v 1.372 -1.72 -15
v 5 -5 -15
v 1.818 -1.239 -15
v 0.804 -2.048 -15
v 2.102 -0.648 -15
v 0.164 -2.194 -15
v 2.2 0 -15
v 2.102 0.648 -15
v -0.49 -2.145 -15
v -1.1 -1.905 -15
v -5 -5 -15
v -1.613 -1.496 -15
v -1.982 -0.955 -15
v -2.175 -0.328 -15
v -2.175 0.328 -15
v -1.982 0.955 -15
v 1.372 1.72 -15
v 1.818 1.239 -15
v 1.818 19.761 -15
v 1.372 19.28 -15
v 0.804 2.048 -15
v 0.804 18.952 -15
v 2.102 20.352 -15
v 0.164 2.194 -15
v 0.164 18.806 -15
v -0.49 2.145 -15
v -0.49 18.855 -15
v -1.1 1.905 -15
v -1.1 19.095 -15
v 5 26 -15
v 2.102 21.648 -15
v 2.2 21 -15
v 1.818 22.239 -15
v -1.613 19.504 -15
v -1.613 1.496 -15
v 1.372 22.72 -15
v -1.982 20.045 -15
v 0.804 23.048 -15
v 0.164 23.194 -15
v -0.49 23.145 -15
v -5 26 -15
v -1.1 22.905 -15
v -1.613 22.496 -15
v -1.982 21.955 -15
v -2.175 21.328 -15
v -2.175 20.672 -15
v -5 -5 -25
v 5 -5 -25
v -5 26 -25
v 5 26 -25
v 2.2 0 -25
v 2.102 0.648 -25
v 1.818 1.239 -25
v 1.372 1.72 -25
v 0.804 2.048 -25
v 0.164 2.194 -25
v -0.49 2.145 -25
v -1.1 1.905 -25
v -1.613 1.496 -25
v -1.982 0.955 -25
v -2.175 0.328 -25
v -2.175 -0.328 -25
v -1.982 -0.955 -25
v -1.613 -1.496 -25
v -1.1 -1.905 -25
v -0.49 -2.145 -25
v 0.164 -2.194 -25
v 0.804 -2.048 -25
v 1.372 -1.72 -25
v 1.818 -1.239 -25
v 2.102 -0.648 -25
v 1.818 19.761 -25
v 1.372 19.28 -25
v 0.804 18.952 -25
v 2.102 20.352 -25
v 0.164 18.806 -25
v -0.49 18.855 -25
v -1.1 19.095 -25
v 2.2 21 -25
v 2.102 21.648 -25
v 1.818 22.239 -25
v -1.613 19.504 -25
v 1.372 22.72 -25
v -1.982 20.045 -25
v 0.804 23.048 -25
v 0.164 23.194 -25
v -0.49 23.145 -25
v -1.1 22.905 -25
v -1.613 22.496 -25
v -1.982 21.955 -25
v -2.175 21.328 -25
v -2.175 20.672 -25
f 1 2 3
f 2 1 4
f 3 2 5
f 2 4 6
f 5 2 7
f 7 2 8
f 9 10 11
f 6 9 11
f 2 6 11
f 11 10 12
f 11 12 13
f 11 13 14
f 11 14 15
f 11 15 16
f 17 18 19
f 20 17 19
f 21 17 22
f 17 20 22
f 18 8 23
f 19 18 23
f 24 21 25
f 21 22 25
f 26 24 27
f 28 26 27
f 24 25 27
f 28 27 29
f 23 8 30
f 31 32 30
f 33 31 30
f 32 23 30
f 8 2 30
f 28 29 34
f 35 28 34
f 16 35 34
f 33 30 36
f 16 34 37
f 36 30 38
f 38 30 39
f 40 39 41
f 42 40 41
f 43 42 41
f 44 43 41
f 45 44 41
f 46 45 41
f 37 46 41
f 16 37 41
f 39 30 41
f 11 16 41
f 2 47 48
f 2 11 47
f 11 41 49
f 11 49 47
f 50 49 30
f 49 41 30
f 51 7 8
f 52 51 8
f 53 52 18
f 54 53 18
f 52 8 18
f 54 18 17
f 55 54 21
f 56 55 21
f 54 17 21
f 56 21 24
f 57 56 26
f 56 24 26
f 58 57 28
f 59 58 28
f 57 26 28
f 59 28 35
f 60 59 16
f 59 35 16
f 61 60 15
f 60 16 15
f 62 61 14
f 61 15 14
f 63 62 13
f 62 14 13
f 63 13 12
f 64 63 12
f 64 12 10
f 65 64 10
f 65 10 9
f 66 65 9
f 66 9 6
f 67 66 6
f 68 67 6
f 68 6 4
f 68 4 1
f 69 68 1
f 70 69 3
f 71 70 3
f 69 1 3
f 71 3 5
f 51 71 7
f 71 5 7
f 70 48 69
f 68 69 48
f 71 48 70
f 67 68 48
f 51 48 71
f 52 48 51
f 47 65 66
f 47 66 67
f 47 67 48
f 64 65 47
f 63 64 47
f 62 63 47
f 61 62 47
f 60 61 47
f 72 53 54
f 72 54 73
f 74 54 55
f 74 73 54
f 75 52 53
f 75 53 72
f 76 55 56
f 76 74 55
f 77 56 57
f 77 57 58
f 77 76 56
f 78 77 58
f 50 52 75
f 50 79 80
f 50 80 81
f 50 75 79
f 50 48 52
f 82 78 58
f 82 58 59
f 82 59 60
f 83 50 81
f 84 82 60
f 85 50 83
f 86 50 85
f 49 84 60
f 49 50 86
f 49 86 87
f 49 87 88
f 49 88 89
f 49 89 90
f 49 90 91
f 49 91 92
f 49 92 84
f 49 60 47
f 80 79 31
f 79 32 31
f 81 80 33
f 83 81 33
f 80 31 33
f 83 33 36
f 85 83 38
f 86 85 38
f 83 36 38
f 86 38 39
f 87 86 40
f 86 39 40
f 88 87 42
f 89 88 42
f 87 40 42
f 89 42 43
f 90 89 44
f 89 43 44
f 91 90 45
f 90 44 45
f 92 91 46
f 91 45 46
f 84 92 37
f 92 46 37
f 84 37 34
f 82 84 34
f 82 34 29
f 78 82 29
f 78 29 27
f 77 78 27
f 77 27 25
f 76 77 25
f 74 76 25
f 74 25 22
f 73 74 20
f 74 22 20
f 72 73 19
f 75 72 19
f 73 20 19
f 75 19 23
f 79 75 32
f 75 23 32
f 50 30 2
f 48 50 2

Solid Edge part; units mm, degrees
sketch "Sketch1" plane through (0, 0, -15) normal (0, 0, 1) x (1, 0, 0)
  circle A0 centre (0, 21) radius 2.2
  line L0 (5, 26) -> (5, -5)
  line L1 (-5, -5) -> (5, -5)
  line L2 (-5, 26) -> (-5, -5)
  line L3 (-5, 26) -> (5, 26)
  circle A1 centre (0, 0) radius 2.2
  dimension "D1" = 5
  dimension "D2" = 5
  dimension "D3" = 4.4
  dimension "D4" = 4.4
  dimension "D5" = 5
  dimension "D6" = 5
  dimension "D7" = 21
extrude "ExtrudedProtrusion_1" add sketch "Sketch1" against normal blind 10
properties material "ABS Plastic, medium impact"
